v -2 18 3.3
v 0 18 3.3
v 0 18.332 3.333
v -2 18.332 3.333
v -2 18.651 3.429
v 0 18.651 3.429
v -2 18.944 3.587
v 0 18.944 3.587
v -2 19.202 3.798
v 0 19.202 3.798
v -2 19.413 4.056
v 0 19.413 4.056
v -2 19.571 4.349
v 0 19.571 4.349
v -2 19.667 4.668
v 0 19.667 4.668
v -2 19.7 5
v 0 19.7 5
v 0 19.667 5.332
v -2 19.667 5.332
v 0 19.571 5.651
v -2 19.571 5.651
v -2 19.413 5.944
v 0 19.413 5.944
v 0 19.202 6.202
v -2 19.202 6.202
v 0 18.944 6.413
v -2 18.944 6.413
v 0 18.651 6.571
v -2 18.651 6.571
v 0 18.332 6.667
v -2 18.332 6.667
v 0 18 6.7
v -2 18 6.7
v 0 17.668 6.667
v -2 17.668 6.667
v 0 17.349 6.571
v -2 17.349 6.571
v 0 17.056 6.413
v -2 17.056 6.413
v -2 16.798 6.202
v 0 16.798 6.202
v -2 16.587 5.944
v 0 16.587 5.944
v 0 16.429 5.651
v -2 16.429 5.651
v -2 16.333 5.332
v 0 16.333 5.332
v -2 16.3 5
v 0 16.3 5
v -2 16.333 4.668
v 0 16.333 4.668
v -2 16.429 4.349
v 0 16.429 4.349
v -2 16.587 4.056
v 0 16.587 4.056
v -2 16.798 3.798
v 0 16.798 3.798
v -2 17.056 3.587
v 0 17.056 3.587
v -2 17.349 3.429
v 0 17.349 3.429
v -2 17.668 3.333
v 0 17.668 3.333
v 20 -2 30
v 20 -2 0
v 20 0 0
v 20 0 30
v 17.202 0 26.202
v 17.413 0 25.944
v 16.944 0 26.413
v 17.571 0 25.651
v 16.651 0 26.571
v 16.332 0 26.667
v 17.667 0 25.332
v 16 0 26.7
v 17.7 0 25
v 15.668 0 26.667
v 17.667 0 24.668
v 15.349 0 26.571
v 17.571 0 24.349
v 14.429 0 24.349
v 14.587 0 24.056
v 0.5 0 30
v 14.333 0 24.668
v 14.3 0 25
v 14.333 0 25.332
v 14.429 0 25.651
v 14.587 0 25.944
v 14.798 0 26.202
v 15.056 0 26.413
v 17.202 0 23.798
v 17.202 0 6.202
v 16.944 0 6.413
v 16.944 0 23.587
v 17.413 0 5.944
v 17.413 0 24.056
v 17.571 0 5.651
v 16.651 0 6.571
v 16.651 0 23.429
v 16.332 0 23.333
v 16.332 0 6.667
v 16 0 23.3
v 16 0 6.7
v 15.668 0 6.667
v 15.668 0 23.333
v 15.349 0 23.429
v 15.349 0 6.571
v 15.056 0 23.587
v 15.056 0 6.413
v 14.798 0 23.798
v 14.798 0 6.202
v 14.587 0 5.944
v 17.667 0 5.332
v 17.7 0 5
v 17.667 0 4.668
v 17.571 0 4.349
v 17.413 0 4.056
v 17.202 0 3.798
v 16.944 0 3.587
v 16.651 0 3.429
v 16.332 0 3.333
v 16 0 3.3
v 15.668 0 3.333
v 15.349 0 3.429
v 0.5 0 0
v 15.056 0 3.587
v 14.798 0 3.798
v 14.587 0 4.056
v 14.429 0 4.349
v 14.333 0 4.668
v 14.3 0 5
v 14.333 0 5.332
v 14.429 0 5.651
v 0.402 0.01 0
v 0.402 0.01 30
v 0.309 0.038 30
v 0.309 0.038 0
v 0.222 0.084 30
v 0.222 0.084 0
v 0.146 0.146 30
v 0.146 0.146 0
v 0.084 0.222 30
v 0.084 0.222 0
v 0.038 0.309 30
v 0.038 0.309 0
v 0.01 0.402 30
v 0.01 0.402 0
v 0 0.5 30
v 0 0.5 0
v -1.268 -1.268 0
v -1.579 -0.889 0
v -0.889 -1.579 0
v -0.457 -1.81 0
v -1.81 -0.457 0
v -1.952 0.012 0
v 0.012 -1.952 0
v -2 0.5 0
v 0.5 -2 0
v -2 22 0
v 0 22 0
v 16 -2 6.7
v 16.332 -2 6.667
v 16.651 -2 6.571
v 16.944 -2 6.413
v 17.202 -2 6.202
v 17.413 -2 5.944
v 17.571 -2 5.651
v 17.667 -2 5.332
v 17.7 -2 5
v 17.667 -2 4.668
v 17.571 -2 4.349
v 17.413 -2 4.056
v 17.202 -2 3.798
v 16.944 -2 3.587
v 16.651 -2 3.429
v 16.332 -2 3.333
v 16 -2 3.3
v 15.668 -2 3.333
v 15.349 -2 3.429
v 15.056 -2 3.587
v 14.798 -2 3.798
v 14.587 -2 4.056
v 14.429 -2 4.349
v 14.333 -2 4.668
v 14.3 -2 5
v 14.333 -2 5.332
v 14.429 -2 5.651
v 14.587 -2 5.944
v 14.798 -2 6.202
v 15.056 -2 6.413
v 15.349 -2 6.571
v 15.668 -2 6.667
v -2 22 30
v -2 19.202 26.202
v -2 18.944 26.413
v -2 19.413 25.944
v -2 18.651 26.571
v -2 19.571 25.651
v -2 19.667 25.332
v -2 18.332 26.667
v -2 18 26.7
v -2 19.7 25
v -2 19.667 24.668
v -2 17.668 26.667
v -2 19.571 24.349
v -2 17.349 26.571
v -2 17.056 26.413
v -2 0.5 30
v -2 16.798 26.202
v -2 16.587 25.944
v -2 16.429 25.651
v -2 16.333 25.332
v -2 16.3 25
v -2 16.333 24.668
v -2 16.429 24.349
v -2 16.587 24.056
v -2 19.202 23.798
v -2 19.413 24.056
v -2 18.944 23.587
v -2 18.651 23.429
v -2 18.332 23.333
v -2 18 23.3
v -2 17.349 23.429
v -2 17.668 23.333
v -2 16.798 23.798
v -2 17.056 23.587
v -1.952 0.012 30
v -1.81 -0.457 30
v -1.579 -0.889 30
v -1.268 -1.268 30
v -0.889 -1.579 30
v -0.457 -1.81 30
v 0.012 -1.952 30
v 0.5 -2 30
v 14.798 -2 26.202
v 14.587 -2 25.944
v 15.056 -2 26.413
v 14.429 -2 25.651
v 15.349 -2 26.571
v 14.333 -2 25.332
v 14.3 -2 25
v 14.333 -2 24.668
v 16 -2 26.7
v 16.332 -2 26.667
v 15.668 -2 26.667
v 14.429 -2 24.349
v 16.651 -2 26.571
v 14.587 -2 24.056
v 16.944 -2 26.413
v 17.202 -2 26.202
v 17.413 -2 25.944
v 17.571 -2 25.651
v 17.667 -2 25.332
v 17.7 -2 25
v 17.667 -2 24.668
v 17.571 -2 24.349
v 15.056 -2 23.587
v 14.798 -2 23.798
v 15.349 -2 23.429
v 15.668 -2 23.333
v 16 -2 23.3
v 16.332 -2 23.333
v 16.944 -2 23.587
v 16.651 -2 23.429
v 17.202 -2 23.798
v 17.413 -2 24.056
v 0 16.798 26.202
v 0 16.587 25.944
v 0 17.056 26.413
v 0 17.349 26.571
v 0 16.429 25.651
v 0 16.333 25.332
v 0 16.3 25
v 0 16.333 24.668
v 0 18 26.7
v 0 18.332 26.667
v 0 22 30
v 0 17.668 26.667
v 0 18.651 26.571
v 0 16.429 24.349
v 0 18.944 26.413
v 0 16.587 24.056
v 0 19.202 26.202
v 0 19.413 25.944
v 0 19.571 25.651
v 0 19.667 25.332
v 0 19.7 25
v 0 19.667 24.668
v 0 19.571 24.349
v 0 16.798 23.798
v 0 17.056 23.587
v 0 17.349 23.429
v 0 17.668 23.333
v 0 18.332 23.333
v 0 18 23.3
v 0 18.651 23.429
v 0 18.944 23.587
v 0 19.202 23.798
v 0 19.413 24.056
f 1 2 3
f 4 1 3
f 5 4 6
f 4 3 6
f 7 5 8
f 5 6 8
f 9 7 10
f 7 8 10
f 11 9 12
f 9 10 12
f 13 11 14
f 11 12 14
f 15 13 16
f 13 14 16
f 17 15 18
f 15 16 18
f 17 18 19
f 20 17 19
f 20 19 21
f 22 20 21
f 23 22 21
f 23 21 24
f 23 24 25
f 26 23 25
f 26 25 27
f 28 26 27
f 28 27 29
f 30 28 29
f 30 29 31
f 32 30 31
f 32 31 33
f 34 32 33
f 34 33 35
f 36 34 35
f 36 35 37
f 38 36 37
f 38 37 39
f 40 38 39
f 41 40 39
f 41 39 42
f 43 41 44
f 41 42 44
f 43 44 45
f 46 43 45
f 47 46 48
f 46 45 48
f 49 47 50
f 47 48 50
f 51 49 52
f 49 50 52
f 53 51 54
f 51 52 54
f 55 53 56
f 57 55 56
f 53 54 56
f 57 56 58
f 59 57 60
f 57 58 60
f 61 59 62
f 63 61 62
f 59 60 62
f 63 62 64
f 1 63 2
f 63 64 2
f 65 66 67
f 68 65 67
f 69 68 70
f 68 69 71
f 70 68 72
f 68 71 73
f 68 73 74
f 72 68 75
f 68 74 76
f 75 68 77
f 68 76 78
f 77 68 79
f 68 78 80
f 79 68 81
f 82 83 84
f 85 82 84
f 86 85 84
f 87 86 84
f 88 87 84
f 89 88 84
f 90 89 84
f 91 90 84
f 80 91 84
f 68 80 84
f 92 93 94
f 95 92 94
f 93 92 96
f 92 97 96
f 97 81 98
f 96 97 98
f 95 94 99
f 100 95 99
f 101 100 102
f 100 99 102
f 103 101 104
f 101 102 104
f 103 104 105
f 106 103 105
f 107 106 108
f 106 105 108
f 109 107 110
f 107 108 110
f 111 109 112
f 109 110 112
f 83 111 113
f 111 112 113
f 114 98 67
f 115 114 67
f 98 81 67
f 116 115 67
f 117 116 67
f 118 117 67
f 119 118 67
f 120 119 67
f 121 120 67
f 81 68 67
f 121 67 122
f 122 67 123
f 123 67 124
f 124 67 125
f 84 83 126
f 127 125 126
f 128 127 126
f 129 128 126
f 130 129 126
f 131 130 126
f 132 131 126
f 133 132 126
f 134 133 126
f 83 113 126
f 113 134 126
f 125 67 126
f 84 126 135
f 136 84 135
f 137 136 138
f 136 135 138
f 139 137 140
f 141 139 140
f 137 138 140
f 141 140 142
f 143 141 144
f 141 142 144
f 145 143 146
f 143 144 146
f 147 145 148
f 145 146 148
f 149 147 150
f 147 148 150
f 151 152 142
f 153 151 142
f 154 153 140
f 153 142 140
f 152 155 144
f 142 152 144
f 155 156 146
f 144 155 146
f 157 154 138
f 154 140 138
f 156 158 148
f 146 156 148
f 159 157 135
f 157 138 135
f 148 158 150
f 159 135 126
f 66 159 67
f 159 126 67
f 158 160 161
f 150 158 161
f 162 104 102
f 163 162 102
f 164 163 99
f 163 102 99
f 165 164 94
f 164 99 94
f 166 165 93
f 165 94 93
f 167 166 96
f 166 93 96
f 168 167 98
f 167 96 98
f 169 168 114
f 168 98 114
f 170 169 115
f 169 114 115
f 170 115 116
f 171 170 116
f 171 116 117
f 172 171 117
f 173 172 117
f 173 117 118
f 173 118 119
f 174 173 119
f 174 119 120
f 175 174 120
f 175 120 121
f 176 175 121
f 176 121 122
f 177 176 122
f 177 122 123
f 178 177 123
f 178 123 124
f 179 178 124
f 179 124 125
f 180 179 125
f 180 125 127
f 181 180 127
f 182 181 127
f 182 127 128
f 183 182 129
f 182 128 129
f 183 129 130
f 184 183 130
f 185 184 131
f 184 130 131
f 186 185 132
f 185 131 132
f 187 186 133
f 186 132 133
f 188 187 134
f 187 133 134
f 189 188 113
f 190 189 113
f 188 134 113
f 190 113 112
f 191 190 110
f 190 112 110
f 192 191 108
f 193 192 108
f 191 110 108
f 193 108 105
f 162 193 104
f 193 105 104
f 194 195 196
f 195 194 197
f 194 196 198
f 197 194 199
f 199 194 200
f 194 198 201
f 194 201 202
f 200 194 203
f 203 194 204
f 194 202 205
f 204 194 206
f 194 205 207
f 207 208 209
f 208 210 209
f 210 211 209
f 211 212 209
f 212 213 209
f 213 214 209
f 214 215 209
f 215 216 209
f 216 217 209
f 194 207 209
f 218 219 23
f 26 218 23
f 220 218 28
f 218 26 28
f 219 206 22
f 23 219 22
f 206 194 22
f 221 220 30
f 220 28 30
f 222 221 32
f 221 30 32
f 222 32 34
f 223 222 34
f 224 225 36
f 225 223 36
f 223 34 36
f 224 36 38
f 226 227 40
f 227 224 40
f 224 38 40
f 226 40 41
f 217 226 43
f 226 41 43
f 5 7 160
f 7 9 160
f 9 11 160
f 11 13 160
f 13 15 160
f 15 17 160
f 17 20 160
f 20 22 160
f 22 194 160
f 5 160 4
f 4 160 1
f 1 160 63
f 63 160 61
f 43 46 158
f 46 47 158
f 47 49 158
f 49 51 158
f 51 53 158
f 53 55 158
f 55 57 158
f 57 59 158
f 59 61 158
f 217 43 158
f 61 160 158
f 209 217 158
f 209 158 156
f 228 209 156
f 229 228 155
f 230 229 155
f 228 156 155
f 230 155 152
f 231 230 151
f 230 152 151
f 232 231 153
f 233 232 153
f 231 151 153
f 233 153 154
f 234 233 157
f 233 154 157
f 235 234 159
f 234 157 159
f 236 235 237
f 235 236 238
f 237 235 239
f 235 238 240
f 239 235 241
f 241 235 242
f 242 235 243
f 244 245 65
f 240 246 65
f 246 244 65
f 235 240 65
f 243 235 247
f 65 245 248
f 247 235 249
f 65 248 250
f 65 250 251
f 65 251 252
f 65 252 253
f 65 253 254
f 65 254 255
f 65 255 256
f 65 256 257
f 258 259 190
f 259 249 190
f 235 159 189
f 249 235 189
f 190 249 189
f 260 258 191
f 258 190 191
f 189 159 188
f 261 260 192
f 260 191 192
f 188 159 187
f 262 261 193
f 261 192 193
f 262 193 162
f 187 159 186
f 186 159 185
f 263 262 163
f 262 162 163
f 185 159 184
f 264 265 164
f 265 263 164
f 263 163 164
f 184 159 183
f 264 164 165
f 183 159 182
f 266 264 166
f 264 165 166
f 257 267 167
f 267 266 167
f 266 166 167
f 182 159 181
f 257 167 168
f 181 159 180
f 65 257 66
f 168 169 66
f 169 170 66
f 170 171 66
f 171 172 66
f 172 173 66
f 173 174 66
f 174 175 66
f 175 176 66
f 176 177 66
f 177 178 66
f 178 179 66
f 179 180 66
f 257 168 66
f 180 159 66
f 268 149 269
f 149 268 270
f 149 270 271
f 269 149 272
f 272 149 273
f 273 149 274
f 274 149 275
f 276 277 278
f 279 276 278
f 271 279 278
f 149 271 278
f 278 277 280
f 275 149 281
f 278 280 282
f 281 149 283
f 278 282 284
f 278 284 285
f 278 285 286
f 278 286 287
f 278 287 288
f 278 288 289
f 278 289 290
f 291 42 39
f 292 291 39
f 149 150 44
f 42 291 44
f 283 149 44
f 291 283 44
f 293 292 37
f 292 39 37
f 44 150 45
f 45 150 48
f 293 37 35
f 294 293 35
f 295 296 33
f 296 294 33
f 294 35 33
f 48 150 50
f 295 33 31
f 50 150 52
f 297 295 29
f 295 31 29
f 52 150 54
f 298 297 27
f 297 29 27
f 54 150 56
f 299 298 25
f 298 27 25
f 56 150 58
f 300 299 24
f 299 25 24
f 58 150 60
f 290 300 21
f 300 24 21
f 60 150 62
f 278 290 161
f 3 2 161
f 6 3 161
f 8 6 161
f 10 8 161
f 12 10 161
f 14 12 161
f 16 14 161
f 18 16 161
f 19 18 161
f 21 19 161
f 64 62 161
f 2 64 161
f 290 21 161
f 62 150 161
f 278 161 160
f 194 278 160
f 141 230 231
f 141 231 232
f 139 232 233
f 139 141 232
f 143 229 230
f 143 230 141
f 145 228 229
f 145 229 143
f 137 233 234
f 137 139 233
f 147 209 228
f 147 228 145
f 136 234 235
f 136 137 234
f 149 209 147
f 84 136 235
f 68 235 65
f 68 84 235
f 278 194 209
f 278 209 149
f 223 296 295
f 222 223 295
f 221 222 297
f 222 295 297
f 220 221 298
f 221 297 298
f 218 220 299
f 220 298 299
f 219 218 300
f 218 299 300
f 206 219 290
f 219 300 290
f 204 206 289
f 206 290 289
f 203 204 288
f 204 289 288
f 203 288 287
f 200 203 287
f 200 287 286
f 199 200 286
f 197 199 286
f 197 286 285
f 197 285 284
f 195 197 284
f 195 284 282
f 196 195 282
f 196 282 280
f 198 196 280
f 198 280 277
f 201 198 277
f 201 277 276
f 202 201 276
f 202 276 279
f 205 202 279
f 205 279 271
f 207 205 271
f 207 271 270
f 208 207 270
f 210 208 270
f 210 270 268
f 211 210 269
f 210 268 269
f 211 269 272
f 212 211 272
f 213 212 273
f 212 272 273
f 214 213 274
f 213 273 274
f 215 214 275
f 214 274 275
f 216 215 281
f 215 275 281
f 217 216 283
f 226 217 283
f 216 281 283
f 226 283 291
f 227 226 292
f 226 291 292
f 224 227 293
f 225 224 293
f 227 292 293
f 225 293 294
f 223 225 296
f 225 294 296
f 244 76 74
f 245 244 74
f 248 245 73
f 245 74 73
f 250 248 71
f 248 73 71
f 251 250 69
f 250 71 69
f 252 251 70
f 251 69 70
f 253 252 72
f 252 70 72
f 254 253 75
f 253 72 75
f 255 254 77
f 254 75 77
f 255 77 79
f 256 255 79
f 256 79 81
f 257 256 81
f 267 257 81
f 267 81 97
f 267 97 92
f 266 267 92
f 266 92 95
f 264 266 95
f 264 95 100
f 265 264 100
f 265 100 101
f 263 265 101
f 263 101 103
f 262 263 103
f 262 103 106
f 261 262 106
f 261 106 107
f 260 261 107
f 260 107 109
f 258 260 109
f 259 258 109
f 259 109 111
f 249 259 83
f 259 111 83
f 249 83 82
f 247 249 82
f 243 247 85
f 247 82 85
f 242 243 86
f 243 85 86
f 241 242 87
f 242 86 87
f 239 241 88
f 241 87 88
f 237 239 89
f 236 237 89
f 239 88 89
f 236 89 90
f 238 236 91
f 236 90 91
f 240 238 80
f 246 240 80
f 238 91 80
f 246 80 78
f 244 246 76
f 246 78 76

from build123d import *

# Parameters (mm, degrees)
SM_BASE_FLANGE_1_DEPTH = 30
SKETCH_6_R             = 1.7
CUT_EXTRUDE_1_DEPTH    = 10
SKETCH_7_R             = 1.7
CUT_EXTRUDE_2_DEPTH    = 10


# Sheet-metal steps are written as plain solids
with BuildPart() as part:
    # Sketch 1 → 基体-法兰1 (new body)
    with BuildSketch(Plane.XY):
        with BuildLine():
            Line((20, 0), (0.5, 0))
            ThreePointArc((0.5, 0), (0.146446609, 0.146446609), (0, 0.5))
            Line((0, 0.5), (0, 22))
            Line((0, 22), (-2, 22))
            Line((-2, 22), (-2, 0.5))
            ThreePointArc((-2, 0.5), (-1.267766953, -1.267766953), (0.5, -2))
            Line((0.5, -2), (20, -2))
            Line((20, -2), (20, 0))
        make_face()
    extrude(amount=SM_BASE_FLANGE_1_DEPTH)

    # 草图6 → 切除-拉伸1 (cut)
    with BuildSketch(Plane(origin=(0, 0, 0), x_dir=(0, 0, -1), z_dir=(1, 0, 0))):
        with Locations((-25, 18)):
            Circle(SKETCH_6_R)
        with Locations((-5, 18)):
            Circle(SKETCH_6_R)
    extrude(amount=-CUT_EXTRUDE_1_DEPTH, mode=Mode.SUBTRACT)

    # 草图7 → 切除-拉伸2 (cut)
    with BuildSketch(Plane(origin=(0, 0, 0), x_dir=(1, 0, 0), z_dir=(0, 1, 0))):
        with Locations(Location((16, -5, 0), (0, 0, 270))):
            Circle(SKETCH_7_R)
        with Locations(Location((16, -25, 0), (0, 0, 270))):
            Circle(SKETCH_7_R)
    extrude(amount=-CUT_EXTRUDE_2_DEPTH, mode=Mode.SUBTRACT)


solid = part.part
